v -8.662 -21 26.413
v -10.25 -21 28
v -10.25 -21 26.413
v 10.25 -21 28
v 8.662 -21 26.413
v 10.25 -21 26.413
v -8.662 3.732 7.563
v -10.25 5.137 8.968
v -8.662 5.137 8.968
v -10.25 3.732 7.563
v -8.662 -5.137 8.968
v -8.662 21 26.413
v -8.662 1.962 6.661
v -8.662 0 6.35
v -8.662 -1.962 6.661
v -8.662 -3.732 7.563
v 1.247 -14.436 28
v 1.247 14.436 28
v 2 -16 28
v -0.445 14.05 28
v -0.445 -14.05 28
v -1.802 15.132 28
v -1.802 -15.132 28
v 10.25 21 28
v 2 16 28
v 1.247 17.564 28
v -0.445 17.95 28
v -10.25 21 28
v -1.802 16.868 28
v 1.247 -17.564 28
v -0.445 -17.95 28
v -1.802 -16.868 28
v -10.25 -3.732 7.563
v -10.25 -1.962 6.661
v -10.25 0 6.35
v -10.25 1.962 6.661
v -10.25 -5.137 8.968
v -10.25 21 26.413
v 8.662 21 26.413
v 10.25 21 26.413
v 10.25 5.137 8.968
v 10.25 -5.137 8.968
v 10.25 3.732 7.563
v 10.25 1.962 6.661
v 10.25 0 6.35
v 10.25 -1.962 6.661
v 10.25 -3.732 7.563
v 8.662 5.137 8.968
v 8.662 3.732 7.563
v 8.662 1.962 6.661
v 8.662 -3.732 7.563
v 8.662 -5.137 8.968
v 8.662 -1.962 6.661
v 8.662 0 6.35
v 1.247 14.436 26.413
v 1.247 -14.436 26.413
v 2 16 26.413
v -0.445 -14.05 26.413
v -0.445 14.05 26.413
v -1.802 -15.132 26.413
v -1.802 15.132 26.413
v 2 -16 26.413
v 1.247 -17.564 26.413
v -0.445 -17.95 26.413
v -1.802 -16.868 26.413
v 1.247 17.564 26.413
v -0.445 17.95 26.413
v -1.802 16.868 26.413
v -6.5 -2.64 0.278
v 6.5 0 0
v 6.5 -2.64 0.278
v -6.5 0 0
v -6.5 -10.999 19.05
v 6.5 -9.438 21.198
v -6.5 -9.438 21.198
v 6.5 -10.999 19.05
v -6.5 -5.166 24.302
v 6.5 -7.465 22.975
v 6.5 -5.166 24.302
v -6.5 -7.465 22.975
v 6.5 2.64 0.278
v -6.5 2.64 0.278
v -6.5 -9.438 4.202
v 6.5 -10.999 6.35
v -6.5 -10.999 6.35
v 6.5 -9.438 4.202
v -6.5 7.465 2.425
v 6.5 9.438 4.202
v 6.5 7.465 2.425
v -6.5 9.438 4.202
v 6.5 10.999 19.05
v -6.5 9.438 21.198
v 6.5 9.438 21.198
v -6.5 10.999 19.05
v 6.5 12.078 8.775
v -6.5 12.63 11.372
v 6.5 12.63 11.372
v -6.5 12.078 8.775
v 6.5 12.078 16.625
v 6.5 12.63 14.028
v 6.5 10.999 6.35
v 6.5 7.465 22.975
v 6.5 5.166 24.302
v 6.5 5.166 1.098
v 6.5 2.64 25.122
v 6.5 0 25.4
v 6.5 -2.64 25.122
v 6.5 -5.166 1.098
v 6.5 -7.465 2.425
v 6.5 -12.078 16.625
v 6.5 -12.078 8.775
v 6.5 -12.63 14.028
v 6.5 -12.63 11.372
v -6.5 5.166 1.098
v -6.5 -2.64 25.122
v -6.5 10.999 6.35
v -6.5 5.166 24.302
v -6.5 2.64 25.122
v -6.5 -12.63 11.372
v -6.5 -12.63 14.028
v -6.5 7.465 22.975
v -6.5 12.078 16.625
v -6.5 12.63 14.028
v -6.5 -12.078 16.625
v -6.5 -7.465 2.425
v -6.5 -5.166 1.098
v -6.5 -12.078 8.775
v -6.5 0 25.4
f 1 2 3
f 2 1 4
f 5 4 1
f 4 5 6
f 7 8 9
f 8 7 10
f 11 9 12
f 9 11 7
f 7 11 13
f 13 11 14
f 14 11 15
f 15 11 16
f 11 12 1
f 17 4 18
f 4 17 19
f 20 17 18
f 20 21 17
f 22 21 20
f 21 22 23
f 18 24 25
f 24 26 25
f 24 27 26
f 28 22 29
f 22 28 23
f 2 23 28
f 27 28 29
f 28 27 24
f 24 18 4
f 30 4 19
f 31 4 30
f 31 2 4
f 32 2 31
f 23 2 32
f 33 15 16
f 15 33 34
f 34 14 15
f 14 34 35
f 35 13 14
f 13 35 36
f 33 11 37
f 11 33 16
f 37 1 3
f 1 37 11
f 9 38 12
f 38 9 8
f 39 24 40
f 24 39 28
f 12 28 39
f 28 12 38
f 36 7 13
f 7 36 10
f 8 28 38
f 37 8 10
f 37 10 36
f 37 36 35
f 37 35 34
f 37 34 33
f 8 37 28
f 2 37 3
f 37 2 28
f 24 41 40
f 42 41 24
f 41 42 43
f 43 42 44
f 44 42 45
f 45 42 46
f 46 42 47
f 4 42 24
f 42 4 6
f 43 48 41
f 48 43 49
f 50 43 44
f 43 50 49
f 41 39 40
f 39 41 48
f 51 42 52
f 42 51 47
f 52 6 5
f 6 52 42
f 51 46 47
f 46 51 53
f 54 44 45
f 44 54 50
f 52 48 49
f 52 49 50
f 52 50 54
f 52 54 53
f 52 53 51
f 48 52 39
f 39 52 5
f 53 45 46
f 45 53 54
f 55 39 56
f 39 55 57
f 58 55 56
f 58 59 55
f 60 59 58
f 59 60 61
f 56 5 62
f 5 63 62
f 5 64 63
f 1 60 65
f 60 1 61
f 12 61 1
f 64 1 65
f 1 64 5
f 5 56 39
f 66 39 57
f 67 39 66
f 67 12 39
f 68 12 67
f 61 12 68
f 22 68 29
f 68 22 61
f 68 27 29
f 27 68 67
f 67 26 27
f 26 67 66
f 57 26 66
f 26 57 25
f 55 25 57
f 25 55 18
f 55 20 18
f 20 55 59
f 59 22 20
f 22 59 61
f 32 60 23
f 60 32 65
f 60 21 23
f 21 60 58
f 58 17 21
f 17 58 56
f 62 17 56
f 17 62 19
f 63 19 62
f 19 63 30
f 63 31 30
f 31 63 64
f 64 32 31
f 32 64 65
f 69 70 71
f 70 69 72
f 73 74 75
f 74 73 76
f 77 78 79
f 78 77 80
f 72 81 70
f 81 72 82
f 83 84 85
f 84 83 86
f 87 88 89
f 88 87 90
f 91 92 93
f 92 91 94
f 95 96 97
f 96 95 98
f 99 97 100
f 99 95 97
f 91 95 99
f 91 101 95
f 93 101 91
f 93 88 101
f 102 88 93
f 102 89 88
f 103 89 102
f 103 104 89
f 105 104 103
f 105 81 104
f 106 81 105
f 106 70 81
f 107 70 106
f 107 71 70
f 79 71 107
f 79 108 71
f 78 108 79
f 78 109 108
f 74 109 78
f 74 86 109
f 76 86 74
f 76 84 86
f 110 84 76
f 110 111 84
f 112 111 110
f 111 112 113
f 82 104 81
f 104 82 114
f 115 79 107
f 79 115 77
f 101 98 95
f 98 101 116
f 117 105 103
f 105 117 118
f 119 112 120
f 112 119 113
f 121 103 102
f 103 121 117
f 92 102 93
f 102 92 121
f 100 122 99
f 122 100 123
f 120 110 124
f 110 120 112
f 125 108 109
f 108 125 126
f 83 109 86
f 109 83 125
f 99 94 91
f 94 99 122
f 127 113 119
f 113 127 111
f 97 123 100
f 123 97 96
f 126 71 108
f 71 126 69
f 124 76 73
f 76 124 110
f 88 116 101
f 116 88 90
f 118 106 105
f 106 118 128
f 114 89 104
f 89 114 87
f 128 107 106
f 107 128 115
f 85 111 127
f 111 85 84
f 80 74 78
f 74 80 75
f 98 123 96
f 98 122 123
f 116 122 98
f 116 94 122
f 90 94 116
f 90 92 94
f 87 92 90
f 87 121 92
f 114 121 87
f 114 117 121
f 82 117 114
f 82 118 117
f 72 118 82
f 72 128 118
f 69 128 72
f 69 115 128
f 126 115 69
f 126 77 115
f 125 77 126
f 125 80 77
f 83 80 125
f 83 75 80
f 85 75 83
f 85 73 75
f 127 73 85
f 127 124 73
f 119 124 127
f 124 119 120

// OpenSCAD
// file: common.scad
pad=0.1;
in=25.4;
zero=0.01;

wood=in/2;
// 2x4 actual dimensions
two=38;
four=90;

bed_x=1530;
bed_y=2030;
bed_z=12*in;
bed_wood=wood;

overhang=10*in;

caster_x=20.5;
caster_y=42;
wheel_z=28;

leg_angle=atan(overhang/(bed_z-bed_wood-two));
function leg_y(z)=bed_y-overhang+tan(leg_angle)*z-wood;
leg_x=four+wood*2;

mattress_r=2*in;

pillowboard_y=4*in;
pillowboard_depth=bed_wood+two;

spine_end=0;
spines=6;
spine_gap=(bed_y-four-spine_end*2)/(spines-1);

module corner(r) {
	offset(r*2)
	offset(-r*2)
	children();
}

module wood(w=wood) {
	linear_extrude(height=w)
	children();
}

module dirror_y(y=0) {
	children();
	translate([0,y])
	mirror([0,1])
	children();

}

module dirror_x(x=0) {
	children();
	translate([x,0])
	mirror([1,0])
	children();

}
// main file
include <common.scad>

wheel_hole=5*in;
wheel=in;
wheel_d=13;
caster_hole=4;
caster_gap=32;
caster_wall=in/16;

module caster() {
	axle=wheel/2;

	translate([0,0,wheel_z]) {
		color("silver")
		translate([0,0,-caster_wall])
		linear_extrude(height=caster_wall)
		difference() {
			square([caster_x,caster_y],center=true);
			dirror_y()
			translate([0,caster_gap/2])
			circle(d=caster_hole);
		}

		color("silver")
		dirror_x()
		translate([-caster_x/2,0])
		hull() {
			translate([0,-caster_y/2,-caster_wall])
			cube([caster_wall,caster_y,caster_wall]);
			translate([0,0,-wheel_z+wheel/2])
			rotate([0,90,0])
			cylinder(d=axle,h=caster_wall);
		}

		translate([0,0,wheel/2-wheel_z])
		rotate([0,90])
		color("#555555")
		cylinder(d=wheel,h=wheel_d,center=true);
	}
}

caster();
